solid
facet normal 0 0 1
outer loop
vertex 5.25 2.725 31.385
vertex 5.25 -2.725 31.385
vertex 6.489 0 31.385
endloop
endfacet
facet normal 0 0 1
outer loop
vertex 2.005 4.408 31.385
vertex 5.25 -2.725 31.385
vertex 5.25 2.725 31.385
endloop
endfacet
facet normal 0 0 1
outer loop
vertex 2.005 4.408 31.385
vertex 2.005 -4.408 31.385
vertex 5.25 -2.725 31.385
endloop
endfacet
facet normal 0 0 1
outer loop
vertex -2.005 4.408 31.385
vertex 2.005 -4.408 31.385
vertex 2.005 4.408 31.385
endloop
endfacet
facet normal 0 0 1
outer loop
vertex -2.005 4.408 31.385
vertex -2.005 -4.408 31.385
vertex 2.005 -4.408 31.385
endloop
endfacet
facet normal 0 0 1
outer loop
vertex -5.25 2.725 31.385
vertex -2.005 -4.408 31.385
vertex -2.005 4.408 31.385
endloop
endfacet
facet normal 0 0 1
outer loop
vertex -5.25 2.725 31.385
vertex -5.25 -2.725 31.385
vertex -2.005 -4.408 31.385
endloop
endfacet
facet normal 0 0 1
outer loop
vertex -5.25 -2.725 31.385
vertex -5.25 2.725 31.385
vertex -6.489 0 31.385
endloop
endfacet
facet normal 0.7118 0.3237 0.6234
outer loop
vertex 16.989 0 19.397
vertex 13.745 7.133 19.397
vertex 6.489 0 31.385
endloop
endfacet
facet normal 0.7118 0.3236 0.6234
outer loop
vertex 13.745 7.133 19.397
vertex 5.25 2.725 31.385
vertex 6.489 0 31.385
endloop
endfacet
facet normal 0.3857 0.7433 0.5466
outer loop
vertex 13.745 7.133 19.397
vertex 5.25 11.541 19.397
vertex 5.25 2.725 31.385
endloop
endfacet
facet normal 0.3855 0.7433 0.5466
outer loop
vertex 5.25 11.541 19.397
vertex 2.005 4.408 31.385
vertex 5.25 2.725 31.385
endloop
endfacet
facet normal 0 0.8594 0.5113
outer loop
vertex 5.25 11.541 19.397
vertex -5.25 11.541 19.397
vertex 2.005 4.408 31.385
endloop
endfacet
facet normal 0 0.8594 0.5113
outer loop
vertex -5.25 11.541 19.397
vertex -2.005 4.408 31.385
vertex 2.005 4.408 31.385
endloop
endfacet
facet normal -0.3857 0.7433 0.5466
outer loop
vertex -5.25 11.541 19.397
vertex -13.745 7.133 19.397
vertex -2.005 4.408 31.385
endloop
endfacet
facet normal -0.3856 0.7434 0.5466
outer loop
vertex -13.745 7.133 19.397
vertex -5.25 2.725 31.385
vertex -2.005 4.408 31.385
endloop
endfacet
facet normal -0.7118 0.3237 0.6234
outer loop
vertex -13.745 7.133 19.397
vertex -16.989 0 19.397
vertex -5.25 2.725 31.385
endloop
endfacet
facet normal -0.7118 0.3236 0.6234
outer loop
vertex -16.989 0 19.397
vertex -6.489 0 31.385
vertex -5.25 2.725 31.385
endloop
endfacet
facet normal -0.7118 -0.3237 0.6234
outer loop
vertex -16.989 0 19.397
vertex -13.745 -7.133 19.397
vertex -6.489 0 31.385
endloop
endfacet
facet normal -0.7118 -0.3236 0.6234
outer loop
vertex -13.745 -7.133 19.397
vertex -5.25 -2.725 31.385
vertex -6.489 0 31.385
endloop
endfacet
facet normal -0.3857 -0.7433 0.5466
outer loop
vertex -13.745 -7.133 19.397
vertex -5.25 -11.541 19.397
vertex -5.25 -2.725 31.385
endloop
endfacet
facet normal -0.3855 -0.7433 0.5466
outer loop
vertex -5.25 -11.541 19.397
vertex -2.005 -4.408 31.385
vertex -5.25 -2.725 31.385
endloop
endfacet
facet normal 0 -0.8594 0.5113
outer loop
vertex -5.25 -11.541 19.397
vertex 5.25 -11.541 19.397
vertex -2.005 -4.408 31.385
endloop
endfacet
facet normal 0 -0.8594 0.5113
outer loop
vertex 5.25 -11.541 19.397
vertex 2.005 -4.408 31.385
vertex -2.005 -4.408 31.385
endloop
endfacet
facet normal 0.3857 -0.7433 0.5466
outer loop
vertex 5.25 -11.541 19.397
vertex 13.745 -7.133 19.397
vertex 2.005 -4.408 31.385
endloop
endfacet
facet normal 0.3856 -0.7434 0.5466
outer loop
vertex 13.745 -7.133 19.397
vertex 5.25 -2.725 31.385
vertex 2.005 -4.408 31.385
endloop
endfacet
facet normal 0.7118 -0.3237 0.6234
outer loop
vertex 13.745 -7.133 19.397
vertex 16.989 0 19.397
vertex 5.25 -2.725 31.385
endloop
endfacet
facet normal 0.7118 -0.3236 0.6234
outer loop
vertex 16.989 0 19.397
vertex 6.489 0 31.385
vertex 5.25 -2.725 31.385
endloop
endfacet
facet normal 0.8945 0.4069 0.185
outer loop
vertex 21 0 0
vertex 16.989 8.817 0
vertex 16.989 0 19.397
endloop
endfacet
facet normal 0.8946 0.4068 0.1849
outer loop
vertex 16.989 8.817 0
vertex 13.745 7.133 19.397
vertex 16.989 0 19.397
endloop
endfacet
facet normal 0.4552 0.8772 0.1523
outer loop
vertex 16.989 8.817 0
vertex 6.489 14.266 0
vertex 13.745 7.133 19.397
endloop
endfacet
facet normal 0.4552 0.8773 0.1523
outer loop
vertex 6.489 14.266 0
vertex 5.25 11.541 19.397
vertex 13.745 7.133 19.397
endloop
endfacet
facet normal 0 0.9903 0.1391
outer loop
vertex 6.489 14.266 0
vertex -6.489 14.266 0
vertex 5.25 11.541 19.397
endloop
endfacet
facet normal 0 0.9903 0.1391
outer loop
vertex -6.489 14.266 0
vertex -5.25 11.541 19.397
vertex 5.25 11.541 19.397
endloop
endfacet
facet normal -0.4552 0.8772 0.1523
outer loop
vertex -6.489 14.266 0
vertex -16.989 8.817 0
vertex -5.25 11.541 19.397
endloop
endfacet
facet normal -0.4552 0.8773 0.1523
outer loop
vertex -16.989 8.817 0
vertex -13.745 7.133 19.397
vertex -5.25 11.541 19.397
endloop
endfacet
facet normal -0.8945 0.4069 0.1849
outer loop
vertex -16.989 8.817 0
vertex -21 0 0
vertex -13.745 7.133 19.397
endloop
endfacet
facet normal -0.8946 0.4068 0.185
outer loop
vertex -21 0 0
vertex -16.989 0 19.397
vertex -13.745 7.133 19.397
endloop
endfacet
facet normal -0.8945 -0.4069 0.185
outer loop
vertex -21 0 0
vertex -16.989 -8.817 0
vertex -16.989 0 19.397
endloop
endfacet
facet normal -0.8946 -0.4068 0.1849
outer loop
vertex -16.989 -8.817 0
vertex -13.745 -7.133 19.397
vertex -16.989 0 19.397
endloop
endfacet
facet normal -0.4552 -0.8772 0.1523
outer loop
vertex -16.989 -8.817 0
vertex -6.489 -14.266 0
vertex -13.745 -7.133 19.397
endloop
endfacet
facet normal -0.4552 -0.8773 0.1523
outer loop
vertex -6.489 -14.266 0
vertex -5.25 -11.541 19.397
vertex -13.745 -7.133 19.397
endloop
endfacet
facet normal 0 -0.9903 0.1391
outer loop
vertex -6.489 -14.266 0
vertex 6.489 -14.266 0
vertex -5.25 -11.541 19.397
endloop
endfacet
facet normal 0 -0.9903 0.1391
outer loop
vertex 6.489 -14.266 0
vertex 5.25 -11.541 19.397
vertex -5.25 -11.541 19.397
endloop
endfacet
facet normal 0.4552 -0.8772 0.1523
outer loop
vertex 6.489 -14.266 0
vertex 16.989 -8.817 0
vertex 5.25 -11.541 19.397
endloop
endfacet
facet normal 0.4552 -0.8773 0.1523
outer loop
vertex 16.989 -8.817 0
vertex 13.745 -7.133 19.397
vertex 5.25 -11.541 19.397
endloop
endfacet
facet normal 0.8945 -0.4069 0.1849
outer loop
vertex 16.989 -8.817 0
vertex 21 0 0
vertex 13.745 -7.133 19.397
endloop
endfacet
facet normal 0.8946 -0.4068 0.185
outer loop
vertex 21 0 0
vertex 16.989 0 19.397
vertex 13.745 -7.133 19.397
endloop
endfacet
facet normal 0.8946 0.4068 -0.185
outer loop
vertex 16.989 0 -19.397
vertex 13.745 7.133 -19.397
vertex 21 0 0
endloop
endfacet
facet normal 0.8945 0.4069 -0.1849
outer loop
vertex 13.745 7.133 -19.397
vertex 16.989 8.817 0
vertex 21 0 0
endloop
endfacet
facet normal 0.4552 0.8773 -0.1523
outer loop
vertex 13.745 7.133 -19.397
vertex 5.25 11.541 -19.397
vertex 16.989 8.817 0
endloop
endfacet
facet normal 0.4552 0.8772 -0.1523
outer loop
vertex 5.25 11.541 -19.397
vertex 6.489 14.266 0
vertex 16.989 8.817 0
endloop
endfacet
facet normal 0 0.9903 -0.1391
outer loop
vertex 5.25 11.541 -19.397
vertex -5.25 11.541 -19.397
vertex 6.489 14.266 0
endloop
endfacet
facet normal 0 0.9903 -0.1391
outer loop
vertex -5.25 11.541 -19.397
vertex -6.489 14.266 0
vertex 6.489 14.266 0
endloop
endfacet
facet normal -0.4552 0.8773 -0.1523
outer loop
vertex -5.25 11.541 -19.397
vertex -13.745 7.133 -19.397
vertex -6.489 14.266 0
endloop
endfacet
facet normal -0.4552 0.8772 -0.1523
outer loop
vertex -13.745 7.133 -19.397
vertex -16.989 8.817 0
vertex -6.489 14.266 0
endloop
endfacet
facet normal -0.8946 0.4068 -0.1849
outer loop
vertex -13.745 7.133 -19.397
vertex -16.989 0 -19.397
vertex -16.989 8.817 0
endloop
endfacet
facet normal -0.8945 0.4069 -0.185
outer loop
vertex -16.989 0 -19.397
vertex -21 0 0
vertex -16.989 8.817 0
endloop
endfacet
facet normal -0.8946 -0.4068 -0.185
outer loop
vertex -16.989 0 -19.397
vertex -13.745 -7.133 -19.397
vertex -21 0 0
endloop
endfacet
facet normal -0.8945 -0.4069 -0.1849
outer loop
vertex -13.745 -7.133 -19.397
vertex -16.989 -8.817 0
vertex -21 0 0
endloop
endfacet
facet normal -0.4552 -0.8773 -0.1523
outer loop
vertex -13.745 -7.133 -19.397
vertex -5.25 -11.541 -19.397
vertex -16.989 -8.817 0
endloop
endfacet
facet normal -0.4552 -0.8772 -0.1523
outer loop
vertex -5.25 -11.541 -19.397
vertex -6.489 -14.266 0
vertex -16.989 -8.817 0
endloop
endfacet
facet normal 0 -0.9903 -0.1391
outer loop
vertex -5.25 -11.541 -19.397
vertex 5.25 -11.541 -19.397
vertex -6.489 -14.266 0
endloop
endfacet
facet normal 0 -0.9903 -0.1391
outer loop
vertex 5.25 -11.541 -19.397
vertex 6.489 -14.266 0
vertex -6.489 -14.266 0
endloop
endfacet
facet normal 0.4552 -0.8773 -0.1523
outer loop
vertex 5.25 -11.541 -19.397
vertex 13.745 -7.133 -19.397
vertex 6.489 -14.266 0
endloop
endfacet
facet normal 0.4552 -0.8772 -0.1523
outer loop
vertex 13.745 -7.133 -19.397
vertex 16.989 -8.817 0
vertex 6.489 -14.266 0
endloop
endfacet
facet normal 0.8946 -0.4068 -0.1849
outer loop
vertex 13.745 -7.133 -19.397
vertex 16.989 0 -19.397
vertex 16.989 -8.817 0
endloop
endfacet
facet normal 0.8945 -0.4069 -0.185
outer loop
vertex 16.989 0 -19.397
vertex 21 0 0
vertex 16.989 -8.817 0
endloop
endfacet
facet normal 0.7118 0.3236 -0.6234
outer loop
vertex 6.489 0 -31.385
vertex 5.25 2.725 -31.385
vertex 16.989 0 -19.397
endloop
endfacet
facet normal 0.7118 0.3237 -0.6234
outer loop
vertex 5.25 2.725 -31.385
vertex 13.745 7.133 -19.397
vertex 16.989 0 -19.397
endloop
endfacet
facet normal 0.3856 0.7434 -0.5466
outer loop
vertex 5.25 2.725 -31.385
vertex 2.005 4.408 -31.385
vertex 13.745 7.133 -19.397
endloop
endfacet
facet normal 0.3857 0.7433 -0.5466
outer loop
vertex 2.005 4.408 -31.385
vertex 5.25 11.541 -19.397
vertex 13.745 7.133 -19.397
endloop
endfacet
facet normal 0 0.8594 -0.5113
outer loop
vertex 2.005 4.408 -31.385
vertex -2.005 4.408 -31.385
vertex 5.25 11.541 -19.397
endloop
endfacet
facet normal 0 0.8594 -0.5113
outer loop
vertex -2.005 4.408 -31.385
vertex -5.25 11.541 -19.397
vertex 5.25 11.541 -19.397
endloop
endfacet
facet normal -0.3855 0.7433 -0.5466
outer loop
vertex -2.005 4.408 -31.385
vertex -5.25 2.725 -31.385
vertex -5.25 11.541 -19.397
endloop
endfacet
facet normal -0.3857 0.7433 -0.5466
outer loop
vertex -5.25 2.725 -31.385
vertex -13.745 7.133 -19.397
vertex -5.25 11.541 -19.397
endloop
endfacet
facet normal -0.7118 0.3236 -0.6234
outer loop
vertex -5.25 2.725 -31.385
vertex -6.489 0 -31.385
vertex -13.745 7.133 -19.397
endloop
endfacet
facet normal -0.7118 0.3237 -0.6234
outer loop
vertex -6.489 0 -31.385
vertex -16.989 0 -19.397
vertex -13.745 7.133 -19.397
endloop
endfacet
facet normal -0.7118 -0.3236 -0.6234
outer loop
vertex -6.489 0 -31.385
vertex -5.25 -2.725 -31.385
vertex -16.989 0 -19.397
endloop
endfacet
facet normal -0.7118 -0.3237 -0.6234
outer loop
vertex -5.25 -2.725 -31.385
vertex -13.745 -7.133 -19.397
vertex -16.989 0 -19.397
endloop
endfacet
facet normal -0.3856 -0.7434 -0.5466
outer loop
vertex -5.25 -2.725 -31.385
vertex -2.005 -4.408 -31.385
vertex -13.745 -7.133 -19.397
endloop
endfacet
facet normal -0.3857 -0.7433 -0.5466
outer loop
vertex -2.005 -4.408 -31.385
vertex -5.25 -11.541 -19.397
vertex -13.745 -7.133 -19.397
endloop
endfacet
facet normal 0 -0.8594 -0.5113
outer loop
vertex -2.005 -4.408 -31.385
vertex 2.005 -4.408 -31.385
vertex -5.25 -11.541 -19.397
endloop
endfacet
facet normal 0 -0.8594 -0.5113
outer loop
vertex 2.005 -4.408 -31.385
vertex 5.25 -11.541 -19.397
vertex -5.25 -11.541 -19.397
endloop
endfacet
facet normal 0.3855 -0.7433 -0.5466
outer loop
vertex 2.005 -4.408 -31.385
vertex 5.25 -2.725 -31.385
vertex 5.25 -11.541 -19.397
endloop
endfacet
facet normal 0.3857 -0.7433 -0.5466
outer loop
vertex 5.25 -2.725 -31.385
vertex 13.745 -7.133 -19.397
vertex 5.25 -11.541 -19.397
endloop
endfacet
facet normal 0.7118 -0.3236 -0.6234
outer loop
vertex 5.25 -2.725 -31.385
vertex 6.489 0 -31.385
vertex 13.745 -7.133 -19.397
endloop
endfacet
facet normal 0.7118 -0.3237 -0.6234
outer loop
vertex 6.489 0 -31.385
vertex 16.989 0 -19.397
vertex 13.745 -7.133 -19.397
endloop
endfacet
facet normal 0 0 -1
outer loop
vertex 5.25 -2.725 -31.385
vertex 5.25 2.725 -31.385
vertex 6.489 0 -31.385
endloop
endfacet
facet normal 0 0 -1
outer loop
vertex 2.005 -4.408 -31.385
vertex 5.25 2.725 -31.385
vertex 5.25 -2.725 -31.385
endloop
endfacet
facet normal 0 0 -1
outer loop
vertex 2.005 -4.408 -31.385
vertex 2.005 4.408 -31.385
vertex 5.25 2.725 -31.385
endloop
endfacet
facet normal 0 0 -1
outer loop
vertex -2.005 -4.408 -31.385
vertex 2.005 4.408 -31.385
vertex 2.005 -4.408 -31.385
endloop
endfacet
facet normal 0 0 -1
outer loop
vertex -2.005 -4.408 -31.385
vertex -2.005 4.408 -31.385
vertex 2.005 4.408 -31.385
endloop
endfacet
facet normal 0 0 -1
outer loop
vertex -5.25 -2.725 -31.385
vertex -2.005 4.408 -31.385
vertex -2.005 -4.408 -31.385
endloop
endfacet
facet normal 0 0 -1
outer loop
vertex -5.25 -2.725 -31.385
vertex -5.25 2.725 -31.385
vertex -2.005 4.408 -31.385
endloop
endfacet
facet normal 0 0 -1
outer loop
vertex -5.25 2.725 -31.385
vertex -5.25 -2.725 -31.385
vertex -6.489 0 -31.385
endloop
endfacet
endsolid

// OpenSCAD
// Generated by SolidPython 1.0.1 on 2020-07-29 00:46:47


scale(v = [7, 5, 11]) {
	sphere(r = 3);
}
/***********************************************
*********      SolidPython code:      **********
************************************************
 
# import packages: SolidPython
from solid import *
from solid.utils import *
from itertools import chain, combinations, permutations


class Resize:

    def __init__(self, scad_file):
        self.scad_file = scad_file
        #self.scad_file = import_scad(scad_file)
        # cone/cylinder param:
        self.r1 = 0
        self.r2 = 0
        self.h = 0
        # rectangular prism param:
        self.w = 0
        self.l = 0
        # ellipse param:
        self.r = 0

    # import OpenScad code (file name corresponds to shape)


    # classify shape + parameters
    def assign(self, param1, param2, param3):
        if self.scad_file == 'cone.scad':
            self.r1 = param1
            self.r2 = param2
            self.h = param3
        elif self.scad_file == 'cylinder.scad':
            self.r1 = param1
            self.r2 = param2
            self.h = param3
        elif self.scad_file == 'rectangularPrism.scad':
            self.h = param1
            self.l = param2
            self.w = param3
        else:
            self.r = param1
            self.h = param2

    # resize parameters
    def iterate(self):
        x = range(3, 20, 2)
        i = 1
        if self.scad_file == 'cone.scad':
            tempList = list(permutations(x, 2))
            for temp in tempList:
                param1 = temp[0]
                param2 = temp[1]
                filepath = 'produced_scad_files/' + 'cone' + str(param1) + '_' + str(param2) + '_' + '.scad'
                scad_render_to_file(cylinder(h=param1, r1=param2, r2=0), filepath)

        elif self.scad_file == 'cylinder.scad':
            tempList = list(permutations(x, 3))
            for temp in tempList:
                param1 = temp[0]
                param2 = temp[1]
                filepath = 'produced_scad_files/' + 'cylinder' + str(param1) + '_' + str(param2) + '_' + '.scad'
                scad_render_to_file(cylinder(h=param1, r1=param2, r2=param2), filepath)

        elif self.scad_file == 'rectangularPrism.scad':
            tempList = list(permutations(x, 3))
            for temp in tempList:
                param1 = temp[0]
                param2 = temp[1]
                param3 = temp[2]
                filepath = 'produced_scad_files/' + 'rectangularPrism' + str(param1) + '_' + str(param2) + '_' + str(
                    param3) + '.scad'
                scad_render_to_file(cube(size=(param1, param2, param3)), filepath)

        elif self.scad_file == 'ellipse.scad':
            tempList = list(permutations(x, 4))
            for temp in tempList:
                param1 = temp[0]
                param2 = temp[1]
                param3 = temp[2]
                param4 = temp[3]
                filepath = 'produced_scad_files/' + 'ellipse' + str(param1) + '_' + str(param2) + '_' + str(param3) + '_' + str(param4) + '.scad'
                scad_render_to_file(scale([param1, param2, param3])(sphere(r=param4)), filepath)

    def render_to_scadfile(self):
        scad_render_to_file(scad, 'example.scad') 
 
************************************************/
